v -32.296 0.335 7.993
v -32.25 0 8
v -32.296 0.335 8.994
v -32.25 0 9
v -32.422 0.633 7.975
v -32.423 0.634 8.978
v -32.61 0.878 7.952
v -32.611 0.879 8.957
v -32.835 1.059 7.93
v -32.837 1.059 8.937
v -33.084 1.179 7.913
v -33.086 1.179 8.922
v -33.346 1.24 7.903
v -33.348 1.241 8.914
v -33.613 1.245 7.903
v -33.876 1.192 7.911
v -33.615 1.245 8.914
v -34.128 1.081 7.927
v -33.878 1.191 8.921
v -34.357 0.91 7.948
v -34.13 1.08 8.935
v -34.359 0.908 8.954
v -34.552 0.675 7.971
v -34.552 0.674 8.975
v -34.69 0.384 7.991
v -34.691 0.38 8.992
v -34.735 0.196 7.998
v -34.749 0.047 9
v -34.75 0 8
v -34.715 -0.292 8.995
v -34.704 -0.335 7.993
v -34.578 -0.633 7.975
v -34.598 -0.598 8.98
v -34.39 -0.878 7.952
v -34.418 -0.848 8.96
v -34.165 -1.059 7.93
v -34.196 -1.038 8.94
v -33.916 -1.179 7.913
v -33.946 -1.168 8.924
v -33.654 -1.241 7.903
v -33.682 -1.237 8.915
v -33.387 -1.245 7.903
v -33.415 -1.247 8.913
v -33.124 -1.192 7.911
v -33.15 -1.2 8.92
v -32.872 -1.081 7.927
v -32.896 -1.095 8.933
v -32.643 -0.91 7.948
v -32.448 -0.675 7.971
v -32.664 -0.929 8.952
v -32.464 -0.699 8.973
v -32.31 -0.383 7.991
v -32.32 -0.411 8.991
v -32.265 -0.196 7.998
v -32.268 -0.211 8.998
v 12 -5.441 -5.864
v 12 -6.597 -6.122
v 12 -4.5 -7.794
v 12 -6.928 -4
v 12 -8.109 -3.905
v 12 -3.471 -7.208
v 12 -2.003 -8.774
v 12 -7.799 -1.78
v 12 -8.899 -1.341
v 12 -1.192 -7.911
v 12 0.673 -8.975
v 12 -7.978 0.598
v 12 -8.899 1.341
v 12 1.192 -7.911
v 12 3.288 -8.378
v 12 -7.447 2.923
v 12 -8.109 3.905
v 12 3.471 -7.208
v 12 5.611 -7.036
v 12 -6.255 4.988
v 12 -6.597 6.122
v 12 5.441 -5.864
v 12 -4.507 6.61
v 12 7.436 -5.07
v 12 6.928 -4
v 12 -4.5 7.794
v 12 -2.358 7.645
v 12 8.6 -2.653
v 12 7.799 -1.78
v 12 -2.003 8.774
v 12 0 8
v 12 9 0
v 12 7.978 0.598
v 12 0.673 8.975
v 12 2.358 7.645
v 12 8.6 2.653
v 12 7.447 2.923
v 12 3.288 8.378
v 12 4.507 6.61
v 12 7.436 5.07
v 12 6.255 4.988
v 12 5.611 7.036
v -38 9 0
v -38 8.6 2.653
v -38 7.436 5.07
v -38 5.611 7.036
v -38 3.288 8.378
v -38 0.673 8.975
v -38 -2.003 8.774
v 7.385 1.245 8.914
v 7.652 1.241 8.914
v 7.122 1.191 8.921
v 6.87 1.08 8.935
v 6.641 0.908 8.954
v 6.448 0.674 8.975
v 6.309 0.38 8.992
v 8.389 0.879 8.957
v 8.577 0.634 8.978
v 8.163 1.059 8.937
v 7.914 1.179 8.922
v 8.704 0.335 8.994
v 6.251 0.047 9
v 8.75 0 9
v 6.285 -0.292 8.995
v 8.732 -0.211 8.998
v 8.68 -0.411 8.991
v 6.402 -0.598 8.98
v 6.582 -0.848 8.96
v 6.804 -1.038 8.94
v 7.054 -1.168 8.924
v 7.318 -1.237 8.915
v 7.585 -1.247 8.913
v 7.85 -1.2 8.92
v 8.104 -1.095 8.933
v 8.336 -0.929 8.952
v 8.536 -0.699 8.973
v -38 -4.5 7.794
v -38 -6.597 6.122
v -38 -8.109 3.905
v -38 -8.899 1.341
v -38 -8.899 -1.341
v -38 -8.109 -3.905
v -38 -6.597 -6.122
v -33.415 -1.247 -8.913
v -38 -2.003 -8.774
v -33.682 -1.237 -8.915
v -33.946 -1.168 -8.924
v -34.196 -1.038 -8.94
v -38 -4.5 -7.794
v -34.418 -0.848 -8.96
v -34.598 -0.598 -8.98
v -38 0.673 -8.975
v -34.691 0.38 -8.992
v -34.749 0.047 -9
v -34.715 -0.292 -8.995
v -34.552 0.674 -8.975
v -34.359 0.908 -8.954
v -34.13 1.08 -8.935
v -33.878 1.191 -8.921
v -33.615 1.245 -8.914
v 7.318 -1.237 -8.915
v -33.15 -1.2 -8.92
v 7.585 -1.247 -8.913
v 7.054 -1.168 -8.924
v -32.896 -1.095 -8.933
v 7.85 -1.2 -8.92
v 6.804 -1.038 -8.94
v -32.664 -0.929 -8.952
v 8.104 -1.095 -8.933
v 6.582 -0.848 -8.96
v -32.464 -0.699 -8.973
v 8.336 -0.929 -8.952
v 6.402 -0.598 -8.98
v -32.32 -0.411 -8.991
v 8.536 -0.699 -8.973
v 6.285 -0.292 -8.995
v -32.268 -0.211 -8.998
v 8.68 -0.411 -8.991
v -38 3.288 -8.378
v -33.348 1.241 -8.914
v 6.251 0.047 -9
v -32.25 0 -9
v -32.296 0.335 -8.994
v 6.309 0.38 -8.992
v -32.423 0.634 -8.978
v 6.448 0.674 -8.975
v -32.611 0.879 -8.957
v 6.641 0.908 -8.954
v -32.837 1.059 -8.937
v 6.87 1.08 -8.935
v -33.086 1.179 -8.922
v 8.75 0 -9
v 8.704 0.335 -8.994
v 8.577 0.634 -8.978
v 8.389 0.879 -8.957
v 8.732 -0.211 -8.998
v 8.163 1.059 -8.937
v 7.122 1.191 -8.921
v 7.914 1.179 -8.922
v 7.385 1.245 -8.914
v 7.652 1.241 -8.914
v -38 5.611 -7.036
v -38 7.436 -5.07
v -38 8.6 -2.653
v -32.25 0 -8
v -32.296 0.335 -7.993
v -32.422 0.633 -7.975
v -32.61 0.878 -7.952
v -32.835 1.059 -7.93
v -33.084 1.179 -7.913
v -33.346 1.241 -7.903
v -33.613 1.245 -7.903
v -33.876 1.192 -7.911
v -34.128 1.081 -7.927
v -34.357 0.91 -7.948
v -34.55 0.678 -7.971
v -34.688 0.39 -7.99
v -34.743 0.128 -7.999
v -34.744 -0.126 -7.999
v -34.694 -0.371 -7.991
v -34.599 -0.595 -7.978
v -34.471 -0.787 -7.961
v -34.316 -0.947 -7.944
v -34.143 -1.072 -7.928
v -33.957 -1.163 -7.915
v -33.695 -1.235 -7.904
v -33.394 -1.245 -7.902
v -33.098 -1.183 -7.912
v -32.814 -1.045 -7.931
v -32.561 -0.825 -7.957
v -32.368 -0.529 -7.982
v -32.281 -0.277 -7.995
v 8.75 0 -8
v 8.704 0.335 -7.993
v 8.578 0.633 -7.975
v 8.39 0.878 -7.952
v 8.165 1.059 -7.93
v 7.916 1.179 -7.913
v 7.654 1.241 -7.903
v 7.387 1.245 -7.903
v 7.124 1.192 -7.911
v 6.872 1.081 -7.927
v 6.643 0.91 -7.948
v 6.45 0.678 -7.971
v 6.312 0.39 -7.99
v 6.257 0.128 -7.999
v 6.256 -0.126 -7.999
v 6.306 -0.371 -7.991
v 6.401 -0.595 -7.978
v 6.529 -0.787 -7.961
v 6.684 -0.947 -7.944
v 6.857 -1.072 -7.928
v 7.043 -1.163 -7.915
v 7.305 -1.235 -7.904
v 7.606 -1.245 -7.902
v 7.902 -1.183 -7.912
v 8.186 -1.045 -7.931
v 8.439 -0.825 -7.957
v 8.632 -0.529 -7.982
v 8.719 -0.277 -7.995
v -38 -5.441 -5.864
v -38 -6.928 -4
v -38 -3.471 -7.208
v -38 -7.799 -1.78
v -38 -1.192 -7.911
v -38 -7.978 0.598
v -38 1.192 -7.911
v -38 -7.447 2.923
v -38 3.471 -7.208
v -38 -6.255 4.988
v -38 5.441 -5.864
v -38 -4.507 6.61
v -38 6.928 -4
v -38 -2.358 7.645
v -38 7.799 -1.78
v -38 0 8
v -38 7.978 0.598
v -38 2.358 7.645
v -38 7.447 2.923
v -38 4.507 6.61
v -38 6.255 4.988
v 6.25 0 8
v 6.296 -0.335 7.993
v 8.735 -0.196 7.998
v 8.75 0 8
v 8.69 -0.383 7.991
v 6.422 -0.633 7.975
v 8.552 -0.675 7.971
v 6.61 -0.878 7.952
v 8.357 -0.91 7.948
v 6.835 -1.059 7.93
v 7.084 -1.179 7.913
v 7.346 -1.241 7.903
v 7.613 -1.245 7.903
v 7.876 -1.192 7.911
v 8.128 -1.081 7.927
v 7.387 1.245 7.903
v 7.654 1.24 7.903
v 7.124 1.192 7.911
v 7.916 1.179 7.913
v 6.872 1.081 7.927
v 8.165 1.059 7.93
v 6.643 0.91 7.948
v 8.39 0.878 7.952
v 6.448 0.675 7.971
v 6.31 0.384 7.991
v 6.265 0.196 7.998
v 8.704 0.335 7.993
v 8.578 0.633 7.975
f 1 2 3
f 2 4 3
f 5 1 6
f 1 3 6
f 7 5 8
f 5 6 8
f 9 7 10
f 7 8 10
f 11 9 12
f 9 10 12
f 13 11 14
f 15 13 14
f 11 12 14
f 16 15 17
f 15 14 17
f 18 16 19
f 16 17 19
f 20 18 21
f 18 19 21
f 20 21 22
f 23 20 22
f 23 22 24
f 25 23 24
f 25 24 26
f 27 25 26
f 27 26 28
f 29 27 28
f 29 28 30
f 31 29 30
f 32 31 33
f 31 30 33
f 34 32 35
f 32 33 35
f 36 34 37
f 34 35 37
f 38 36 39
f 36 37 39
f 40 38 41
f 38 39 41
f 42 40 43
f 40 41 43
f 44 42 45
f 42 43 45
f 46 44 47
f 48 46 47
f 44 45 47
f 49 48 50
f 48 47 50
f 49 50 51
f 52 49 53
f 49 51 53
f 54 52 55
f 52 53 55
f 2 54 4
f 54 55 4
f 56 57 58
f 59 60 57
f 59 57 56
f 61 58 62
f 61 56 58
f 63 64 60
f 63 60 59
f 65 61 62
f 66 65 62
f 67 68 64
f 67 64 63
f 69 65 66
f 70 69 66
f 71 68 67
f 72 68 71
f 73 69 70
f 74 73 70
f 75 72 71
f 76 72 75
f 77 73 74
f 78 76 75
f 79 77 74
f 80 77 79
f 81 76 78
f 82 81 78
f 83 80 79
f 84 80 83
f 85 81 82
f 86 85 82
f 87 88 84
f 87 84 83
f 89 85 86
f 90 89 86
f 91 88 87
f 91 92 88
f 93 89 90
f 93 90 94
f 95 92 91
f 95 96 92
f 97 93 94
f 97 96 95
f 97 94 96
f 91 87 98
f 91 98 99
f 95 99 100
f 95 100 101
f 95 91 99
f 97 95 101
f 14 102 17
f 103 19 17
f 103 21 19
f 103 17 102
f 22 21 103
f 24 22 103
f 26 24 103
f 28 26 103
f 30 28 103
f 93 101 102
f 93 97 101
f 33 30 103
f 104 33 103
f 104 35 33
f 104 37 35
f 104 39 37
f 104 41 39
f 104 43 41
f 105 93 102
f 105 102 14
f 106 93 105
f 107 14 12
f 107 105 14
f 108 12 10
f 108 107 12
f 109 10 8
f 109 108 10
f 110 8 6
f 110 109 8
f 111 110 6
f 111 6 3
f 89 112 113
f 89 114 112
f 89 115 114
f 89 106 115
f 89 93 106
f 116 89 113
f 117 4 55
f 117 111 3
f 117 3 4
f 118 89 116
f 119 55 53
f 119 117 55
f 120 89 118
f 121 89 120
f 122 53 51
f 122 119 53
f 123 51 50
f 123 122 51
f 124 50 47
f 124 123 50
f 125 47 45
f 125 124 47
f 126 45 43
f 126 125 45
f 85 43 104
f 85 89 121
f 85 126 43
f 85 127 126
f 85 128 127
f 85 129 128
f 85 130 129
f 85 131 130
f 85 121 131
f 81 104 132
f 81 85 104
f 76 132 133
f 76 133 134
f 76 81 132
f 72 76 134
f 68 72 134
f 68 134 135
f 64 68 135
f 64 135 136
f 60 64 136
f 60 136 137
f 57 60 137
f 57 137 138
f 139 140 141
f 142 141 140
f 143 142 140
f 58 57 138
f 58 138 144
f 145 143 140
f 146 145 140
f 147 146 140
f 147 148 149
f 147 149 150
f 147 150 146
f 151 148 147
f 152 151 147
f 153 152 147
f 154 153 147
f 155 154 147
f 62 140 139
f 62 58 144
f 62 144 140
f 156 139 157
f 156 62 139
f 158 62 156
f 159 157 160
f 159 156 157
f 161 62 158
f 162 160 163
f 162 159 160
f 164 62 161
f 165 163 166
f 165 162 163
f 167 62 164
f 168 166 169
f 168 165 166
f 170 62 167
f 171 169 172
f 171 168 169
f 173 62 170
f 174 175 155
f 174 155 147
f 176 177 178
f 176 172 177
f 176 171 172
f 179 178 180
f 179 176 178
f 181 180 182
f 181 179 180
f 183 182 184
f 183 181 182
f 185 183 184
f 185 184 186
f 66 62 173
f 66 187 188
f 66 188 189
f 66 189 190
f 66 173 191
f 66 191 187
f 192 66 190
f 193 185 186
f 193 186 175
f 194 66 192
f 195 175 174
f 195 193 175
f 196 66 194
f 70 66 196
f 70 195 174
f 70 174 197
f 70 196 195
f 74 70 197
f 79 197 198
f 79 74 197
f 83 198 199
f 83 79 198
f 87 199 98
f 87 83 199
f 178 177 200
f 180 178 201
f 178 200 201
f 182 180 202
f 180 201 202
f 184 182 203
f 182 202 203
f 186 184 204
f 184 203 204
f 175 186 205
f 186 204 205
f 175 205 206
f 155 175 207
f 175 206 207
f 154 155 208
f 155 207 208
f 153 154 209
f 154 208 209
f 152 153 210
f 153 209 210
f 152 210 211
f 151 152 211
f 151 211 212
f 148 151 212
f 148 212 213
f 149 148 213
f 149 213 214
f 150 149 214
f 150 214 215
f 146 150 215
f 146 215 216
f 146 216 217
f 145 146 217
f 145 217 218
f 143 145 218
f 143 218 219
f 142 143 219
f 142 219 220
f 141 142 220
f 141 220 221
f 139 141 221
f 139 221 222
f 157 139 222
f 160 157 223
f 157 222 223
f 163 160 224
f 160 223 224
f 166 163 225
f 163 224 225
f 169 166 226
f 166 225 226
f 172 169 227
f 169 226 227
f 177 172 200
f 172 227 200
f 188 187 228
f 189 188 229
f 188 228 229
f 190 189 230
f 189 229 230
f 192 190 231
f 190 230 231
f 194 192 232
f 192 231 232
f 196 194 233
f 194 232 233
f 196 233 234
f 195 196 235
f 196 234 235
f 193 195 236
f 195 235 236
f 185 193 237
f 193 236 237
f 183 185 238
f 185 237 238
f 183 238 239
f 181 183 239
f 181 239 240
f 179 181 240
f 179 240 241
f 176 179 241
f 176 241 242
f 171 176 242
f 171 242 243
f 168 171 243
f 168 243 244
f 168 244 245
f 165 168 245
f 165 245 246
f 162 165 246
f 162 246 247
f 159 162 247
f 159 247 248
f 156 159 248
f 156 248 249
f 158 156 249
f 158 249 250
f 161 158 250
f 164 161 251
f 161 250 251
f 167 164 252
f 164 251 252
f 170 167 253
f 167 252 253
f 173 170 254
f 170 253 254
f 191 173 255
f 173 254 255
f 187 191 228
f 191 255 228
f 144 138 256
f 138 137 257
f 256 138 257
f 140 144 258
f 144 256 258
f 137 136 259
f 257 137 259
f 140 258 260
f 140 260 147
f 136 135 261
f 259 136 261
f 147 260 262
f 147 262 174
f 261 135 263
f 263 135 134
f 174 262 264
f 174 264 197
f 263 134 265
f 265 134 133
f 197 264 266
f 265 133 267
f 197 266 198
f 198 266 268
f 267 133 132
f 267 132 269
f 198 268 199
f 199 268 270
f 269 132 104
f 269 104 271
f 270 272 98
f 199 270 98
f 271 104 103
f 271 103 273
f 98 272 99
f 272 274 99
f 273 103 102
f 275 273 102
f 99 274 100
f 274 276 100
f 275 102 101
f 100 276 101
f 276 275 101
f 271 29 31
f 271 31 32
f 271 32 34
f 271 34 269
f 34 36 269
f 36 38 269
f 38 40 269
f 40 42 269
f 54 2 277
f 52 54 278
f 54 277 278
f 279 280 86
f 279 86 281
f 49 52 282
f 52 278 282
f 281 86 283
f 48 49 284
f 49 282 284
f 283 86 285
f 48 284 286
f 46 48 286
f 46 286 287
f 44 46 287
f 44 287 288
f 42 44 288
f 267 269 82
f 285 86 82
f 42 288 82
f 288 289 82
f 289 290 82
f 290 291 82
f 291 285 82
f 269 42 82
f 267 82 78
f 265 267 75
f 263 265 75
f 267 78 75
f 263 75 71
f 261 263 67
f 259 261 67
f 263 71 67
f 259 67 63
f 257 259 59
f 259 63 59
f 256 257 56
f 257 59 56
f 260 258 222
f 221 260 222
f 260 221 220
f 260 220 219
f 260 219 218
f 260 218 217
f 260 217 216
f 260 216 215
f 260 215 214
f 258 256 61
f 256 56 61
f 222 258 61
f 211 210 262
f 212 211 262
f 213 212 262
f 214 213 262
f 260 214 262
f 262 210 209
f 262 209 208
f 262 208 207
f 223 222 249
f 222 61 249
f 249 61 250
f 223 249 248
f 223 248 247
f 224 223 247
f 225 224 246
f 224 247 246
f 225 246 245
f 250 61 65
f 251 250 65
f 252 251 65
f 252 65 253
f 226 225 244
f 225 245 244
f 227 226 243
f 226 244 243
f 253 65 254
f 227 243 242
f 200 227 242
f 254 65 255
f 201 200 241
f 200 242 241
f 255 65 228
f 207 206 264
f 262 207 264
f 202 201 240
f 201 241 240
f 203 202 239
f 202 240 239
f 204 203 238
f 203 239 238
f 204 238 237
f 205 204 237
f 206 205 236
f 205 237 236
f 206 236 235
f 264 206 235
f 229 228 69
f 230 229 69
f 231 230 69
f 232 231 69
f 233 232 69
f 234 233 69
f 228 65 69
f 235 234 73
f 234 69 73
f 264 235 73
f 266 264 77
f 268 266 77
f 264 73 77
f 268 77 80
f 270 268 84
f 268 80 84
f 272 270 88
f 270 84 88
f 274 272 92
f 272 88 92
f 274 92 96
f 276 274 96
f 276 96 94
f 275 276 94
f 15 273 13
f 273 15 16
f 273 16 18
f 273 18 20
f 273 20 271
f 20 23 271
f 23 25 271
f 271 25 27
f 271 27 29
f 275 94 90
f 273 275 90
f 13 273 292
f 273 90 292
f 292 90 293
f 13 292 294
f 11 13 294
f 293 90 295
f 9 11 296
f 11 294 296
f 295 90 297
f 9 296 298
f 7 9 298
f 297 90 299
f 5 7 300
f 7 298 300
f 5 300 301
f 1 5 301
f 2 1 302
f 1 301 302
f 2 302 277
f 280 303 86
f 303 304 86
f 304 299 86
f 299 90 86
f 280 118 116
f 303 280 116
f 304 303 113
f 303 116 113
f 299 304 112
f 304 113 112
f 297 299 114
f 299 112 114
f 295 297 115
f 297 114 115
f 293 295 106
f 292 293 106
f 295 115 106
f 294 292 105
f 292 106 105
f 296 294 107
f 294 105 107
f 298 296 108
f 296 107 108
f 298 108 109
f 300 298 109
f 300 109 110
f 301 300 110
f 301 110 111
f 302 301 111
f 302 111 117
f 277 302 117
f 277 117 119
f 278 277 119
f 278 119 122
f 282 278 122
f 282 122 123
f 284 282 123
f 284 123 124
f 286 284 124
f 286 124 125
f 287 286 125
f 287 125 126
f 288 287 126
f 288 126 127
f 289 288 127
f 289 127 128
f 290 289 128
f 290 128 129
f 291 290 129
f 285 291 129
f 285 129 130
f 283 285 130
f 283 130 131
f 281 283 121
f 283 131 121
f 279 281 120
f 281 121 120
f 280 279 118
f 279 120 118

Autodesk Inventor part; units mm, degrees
ref_plane "YZ Plane" through (0, 0, 0) normal (1, 0, 0) x (0, 1, 0)
ref_plane "XZ Plane" through (0, 0, 0) normal (0, 1, 0) x (-1, 0, 0)
sketch "ShaftProfile" plane through (0, 0, 0) normal (0, 0, 1) x (1, 0, 0)
  line L0 (-48, 0) -> (22, 0) construction
  line L1 (-38, 9) -> (12, 9)
  line L2 (12, 9) -> (12, 0)
  line L3 (-38, 0) -> (-38, 9)
  line L4 (-38, 0) -> (12, 0)
  point P0 (0, 0)
  dimension "d1" = 50
  dimension "d2" = 9
  dimension "d4" = 38
revolve "ShaftFeature" add sketch "ShaftProfile" angle 360 about axis through (-38, 0, 0) along (1, 0, 0)
sketch "Sketch2" plane through (-38, 0, 0) normal (-1, 0, 0) x (0, 0, 1)
  circle A0 centre (0, 0) radius 9 projected
hole "ShaftHoleFeature" at (-38, 0, 0) direction (1, 0, 0) diameter 16 end through all
ref_plane "MidSidePlane" through (0, 0, 10) normal (0, 0, 1) x (1, 0, 0)
sketch "CapHoles" plane through (0, 0, 10) normal (0, 0, 1) x (1, 0, 0)
  line L0 (12, -9) -> (12, 9) construction
  line L1 (-38, -9) -> (-38, 9) construction
  line L2 (-58, 0) -> (82, 0) construction
  circle A0 centre (-33.5, 0) radius 1.25
  circle A1 centre (7.5, 0) radius 1.25
  dimension "d24" = 2.5
  dimension "d25" = 4.5
  dimension "d26" = 4.5
extrude "CapHolesFeature" cut sketch "CapHoles" against normal through all
equation "\"d26\" = d25"
properties part number "BackPair1PistonShaft"
